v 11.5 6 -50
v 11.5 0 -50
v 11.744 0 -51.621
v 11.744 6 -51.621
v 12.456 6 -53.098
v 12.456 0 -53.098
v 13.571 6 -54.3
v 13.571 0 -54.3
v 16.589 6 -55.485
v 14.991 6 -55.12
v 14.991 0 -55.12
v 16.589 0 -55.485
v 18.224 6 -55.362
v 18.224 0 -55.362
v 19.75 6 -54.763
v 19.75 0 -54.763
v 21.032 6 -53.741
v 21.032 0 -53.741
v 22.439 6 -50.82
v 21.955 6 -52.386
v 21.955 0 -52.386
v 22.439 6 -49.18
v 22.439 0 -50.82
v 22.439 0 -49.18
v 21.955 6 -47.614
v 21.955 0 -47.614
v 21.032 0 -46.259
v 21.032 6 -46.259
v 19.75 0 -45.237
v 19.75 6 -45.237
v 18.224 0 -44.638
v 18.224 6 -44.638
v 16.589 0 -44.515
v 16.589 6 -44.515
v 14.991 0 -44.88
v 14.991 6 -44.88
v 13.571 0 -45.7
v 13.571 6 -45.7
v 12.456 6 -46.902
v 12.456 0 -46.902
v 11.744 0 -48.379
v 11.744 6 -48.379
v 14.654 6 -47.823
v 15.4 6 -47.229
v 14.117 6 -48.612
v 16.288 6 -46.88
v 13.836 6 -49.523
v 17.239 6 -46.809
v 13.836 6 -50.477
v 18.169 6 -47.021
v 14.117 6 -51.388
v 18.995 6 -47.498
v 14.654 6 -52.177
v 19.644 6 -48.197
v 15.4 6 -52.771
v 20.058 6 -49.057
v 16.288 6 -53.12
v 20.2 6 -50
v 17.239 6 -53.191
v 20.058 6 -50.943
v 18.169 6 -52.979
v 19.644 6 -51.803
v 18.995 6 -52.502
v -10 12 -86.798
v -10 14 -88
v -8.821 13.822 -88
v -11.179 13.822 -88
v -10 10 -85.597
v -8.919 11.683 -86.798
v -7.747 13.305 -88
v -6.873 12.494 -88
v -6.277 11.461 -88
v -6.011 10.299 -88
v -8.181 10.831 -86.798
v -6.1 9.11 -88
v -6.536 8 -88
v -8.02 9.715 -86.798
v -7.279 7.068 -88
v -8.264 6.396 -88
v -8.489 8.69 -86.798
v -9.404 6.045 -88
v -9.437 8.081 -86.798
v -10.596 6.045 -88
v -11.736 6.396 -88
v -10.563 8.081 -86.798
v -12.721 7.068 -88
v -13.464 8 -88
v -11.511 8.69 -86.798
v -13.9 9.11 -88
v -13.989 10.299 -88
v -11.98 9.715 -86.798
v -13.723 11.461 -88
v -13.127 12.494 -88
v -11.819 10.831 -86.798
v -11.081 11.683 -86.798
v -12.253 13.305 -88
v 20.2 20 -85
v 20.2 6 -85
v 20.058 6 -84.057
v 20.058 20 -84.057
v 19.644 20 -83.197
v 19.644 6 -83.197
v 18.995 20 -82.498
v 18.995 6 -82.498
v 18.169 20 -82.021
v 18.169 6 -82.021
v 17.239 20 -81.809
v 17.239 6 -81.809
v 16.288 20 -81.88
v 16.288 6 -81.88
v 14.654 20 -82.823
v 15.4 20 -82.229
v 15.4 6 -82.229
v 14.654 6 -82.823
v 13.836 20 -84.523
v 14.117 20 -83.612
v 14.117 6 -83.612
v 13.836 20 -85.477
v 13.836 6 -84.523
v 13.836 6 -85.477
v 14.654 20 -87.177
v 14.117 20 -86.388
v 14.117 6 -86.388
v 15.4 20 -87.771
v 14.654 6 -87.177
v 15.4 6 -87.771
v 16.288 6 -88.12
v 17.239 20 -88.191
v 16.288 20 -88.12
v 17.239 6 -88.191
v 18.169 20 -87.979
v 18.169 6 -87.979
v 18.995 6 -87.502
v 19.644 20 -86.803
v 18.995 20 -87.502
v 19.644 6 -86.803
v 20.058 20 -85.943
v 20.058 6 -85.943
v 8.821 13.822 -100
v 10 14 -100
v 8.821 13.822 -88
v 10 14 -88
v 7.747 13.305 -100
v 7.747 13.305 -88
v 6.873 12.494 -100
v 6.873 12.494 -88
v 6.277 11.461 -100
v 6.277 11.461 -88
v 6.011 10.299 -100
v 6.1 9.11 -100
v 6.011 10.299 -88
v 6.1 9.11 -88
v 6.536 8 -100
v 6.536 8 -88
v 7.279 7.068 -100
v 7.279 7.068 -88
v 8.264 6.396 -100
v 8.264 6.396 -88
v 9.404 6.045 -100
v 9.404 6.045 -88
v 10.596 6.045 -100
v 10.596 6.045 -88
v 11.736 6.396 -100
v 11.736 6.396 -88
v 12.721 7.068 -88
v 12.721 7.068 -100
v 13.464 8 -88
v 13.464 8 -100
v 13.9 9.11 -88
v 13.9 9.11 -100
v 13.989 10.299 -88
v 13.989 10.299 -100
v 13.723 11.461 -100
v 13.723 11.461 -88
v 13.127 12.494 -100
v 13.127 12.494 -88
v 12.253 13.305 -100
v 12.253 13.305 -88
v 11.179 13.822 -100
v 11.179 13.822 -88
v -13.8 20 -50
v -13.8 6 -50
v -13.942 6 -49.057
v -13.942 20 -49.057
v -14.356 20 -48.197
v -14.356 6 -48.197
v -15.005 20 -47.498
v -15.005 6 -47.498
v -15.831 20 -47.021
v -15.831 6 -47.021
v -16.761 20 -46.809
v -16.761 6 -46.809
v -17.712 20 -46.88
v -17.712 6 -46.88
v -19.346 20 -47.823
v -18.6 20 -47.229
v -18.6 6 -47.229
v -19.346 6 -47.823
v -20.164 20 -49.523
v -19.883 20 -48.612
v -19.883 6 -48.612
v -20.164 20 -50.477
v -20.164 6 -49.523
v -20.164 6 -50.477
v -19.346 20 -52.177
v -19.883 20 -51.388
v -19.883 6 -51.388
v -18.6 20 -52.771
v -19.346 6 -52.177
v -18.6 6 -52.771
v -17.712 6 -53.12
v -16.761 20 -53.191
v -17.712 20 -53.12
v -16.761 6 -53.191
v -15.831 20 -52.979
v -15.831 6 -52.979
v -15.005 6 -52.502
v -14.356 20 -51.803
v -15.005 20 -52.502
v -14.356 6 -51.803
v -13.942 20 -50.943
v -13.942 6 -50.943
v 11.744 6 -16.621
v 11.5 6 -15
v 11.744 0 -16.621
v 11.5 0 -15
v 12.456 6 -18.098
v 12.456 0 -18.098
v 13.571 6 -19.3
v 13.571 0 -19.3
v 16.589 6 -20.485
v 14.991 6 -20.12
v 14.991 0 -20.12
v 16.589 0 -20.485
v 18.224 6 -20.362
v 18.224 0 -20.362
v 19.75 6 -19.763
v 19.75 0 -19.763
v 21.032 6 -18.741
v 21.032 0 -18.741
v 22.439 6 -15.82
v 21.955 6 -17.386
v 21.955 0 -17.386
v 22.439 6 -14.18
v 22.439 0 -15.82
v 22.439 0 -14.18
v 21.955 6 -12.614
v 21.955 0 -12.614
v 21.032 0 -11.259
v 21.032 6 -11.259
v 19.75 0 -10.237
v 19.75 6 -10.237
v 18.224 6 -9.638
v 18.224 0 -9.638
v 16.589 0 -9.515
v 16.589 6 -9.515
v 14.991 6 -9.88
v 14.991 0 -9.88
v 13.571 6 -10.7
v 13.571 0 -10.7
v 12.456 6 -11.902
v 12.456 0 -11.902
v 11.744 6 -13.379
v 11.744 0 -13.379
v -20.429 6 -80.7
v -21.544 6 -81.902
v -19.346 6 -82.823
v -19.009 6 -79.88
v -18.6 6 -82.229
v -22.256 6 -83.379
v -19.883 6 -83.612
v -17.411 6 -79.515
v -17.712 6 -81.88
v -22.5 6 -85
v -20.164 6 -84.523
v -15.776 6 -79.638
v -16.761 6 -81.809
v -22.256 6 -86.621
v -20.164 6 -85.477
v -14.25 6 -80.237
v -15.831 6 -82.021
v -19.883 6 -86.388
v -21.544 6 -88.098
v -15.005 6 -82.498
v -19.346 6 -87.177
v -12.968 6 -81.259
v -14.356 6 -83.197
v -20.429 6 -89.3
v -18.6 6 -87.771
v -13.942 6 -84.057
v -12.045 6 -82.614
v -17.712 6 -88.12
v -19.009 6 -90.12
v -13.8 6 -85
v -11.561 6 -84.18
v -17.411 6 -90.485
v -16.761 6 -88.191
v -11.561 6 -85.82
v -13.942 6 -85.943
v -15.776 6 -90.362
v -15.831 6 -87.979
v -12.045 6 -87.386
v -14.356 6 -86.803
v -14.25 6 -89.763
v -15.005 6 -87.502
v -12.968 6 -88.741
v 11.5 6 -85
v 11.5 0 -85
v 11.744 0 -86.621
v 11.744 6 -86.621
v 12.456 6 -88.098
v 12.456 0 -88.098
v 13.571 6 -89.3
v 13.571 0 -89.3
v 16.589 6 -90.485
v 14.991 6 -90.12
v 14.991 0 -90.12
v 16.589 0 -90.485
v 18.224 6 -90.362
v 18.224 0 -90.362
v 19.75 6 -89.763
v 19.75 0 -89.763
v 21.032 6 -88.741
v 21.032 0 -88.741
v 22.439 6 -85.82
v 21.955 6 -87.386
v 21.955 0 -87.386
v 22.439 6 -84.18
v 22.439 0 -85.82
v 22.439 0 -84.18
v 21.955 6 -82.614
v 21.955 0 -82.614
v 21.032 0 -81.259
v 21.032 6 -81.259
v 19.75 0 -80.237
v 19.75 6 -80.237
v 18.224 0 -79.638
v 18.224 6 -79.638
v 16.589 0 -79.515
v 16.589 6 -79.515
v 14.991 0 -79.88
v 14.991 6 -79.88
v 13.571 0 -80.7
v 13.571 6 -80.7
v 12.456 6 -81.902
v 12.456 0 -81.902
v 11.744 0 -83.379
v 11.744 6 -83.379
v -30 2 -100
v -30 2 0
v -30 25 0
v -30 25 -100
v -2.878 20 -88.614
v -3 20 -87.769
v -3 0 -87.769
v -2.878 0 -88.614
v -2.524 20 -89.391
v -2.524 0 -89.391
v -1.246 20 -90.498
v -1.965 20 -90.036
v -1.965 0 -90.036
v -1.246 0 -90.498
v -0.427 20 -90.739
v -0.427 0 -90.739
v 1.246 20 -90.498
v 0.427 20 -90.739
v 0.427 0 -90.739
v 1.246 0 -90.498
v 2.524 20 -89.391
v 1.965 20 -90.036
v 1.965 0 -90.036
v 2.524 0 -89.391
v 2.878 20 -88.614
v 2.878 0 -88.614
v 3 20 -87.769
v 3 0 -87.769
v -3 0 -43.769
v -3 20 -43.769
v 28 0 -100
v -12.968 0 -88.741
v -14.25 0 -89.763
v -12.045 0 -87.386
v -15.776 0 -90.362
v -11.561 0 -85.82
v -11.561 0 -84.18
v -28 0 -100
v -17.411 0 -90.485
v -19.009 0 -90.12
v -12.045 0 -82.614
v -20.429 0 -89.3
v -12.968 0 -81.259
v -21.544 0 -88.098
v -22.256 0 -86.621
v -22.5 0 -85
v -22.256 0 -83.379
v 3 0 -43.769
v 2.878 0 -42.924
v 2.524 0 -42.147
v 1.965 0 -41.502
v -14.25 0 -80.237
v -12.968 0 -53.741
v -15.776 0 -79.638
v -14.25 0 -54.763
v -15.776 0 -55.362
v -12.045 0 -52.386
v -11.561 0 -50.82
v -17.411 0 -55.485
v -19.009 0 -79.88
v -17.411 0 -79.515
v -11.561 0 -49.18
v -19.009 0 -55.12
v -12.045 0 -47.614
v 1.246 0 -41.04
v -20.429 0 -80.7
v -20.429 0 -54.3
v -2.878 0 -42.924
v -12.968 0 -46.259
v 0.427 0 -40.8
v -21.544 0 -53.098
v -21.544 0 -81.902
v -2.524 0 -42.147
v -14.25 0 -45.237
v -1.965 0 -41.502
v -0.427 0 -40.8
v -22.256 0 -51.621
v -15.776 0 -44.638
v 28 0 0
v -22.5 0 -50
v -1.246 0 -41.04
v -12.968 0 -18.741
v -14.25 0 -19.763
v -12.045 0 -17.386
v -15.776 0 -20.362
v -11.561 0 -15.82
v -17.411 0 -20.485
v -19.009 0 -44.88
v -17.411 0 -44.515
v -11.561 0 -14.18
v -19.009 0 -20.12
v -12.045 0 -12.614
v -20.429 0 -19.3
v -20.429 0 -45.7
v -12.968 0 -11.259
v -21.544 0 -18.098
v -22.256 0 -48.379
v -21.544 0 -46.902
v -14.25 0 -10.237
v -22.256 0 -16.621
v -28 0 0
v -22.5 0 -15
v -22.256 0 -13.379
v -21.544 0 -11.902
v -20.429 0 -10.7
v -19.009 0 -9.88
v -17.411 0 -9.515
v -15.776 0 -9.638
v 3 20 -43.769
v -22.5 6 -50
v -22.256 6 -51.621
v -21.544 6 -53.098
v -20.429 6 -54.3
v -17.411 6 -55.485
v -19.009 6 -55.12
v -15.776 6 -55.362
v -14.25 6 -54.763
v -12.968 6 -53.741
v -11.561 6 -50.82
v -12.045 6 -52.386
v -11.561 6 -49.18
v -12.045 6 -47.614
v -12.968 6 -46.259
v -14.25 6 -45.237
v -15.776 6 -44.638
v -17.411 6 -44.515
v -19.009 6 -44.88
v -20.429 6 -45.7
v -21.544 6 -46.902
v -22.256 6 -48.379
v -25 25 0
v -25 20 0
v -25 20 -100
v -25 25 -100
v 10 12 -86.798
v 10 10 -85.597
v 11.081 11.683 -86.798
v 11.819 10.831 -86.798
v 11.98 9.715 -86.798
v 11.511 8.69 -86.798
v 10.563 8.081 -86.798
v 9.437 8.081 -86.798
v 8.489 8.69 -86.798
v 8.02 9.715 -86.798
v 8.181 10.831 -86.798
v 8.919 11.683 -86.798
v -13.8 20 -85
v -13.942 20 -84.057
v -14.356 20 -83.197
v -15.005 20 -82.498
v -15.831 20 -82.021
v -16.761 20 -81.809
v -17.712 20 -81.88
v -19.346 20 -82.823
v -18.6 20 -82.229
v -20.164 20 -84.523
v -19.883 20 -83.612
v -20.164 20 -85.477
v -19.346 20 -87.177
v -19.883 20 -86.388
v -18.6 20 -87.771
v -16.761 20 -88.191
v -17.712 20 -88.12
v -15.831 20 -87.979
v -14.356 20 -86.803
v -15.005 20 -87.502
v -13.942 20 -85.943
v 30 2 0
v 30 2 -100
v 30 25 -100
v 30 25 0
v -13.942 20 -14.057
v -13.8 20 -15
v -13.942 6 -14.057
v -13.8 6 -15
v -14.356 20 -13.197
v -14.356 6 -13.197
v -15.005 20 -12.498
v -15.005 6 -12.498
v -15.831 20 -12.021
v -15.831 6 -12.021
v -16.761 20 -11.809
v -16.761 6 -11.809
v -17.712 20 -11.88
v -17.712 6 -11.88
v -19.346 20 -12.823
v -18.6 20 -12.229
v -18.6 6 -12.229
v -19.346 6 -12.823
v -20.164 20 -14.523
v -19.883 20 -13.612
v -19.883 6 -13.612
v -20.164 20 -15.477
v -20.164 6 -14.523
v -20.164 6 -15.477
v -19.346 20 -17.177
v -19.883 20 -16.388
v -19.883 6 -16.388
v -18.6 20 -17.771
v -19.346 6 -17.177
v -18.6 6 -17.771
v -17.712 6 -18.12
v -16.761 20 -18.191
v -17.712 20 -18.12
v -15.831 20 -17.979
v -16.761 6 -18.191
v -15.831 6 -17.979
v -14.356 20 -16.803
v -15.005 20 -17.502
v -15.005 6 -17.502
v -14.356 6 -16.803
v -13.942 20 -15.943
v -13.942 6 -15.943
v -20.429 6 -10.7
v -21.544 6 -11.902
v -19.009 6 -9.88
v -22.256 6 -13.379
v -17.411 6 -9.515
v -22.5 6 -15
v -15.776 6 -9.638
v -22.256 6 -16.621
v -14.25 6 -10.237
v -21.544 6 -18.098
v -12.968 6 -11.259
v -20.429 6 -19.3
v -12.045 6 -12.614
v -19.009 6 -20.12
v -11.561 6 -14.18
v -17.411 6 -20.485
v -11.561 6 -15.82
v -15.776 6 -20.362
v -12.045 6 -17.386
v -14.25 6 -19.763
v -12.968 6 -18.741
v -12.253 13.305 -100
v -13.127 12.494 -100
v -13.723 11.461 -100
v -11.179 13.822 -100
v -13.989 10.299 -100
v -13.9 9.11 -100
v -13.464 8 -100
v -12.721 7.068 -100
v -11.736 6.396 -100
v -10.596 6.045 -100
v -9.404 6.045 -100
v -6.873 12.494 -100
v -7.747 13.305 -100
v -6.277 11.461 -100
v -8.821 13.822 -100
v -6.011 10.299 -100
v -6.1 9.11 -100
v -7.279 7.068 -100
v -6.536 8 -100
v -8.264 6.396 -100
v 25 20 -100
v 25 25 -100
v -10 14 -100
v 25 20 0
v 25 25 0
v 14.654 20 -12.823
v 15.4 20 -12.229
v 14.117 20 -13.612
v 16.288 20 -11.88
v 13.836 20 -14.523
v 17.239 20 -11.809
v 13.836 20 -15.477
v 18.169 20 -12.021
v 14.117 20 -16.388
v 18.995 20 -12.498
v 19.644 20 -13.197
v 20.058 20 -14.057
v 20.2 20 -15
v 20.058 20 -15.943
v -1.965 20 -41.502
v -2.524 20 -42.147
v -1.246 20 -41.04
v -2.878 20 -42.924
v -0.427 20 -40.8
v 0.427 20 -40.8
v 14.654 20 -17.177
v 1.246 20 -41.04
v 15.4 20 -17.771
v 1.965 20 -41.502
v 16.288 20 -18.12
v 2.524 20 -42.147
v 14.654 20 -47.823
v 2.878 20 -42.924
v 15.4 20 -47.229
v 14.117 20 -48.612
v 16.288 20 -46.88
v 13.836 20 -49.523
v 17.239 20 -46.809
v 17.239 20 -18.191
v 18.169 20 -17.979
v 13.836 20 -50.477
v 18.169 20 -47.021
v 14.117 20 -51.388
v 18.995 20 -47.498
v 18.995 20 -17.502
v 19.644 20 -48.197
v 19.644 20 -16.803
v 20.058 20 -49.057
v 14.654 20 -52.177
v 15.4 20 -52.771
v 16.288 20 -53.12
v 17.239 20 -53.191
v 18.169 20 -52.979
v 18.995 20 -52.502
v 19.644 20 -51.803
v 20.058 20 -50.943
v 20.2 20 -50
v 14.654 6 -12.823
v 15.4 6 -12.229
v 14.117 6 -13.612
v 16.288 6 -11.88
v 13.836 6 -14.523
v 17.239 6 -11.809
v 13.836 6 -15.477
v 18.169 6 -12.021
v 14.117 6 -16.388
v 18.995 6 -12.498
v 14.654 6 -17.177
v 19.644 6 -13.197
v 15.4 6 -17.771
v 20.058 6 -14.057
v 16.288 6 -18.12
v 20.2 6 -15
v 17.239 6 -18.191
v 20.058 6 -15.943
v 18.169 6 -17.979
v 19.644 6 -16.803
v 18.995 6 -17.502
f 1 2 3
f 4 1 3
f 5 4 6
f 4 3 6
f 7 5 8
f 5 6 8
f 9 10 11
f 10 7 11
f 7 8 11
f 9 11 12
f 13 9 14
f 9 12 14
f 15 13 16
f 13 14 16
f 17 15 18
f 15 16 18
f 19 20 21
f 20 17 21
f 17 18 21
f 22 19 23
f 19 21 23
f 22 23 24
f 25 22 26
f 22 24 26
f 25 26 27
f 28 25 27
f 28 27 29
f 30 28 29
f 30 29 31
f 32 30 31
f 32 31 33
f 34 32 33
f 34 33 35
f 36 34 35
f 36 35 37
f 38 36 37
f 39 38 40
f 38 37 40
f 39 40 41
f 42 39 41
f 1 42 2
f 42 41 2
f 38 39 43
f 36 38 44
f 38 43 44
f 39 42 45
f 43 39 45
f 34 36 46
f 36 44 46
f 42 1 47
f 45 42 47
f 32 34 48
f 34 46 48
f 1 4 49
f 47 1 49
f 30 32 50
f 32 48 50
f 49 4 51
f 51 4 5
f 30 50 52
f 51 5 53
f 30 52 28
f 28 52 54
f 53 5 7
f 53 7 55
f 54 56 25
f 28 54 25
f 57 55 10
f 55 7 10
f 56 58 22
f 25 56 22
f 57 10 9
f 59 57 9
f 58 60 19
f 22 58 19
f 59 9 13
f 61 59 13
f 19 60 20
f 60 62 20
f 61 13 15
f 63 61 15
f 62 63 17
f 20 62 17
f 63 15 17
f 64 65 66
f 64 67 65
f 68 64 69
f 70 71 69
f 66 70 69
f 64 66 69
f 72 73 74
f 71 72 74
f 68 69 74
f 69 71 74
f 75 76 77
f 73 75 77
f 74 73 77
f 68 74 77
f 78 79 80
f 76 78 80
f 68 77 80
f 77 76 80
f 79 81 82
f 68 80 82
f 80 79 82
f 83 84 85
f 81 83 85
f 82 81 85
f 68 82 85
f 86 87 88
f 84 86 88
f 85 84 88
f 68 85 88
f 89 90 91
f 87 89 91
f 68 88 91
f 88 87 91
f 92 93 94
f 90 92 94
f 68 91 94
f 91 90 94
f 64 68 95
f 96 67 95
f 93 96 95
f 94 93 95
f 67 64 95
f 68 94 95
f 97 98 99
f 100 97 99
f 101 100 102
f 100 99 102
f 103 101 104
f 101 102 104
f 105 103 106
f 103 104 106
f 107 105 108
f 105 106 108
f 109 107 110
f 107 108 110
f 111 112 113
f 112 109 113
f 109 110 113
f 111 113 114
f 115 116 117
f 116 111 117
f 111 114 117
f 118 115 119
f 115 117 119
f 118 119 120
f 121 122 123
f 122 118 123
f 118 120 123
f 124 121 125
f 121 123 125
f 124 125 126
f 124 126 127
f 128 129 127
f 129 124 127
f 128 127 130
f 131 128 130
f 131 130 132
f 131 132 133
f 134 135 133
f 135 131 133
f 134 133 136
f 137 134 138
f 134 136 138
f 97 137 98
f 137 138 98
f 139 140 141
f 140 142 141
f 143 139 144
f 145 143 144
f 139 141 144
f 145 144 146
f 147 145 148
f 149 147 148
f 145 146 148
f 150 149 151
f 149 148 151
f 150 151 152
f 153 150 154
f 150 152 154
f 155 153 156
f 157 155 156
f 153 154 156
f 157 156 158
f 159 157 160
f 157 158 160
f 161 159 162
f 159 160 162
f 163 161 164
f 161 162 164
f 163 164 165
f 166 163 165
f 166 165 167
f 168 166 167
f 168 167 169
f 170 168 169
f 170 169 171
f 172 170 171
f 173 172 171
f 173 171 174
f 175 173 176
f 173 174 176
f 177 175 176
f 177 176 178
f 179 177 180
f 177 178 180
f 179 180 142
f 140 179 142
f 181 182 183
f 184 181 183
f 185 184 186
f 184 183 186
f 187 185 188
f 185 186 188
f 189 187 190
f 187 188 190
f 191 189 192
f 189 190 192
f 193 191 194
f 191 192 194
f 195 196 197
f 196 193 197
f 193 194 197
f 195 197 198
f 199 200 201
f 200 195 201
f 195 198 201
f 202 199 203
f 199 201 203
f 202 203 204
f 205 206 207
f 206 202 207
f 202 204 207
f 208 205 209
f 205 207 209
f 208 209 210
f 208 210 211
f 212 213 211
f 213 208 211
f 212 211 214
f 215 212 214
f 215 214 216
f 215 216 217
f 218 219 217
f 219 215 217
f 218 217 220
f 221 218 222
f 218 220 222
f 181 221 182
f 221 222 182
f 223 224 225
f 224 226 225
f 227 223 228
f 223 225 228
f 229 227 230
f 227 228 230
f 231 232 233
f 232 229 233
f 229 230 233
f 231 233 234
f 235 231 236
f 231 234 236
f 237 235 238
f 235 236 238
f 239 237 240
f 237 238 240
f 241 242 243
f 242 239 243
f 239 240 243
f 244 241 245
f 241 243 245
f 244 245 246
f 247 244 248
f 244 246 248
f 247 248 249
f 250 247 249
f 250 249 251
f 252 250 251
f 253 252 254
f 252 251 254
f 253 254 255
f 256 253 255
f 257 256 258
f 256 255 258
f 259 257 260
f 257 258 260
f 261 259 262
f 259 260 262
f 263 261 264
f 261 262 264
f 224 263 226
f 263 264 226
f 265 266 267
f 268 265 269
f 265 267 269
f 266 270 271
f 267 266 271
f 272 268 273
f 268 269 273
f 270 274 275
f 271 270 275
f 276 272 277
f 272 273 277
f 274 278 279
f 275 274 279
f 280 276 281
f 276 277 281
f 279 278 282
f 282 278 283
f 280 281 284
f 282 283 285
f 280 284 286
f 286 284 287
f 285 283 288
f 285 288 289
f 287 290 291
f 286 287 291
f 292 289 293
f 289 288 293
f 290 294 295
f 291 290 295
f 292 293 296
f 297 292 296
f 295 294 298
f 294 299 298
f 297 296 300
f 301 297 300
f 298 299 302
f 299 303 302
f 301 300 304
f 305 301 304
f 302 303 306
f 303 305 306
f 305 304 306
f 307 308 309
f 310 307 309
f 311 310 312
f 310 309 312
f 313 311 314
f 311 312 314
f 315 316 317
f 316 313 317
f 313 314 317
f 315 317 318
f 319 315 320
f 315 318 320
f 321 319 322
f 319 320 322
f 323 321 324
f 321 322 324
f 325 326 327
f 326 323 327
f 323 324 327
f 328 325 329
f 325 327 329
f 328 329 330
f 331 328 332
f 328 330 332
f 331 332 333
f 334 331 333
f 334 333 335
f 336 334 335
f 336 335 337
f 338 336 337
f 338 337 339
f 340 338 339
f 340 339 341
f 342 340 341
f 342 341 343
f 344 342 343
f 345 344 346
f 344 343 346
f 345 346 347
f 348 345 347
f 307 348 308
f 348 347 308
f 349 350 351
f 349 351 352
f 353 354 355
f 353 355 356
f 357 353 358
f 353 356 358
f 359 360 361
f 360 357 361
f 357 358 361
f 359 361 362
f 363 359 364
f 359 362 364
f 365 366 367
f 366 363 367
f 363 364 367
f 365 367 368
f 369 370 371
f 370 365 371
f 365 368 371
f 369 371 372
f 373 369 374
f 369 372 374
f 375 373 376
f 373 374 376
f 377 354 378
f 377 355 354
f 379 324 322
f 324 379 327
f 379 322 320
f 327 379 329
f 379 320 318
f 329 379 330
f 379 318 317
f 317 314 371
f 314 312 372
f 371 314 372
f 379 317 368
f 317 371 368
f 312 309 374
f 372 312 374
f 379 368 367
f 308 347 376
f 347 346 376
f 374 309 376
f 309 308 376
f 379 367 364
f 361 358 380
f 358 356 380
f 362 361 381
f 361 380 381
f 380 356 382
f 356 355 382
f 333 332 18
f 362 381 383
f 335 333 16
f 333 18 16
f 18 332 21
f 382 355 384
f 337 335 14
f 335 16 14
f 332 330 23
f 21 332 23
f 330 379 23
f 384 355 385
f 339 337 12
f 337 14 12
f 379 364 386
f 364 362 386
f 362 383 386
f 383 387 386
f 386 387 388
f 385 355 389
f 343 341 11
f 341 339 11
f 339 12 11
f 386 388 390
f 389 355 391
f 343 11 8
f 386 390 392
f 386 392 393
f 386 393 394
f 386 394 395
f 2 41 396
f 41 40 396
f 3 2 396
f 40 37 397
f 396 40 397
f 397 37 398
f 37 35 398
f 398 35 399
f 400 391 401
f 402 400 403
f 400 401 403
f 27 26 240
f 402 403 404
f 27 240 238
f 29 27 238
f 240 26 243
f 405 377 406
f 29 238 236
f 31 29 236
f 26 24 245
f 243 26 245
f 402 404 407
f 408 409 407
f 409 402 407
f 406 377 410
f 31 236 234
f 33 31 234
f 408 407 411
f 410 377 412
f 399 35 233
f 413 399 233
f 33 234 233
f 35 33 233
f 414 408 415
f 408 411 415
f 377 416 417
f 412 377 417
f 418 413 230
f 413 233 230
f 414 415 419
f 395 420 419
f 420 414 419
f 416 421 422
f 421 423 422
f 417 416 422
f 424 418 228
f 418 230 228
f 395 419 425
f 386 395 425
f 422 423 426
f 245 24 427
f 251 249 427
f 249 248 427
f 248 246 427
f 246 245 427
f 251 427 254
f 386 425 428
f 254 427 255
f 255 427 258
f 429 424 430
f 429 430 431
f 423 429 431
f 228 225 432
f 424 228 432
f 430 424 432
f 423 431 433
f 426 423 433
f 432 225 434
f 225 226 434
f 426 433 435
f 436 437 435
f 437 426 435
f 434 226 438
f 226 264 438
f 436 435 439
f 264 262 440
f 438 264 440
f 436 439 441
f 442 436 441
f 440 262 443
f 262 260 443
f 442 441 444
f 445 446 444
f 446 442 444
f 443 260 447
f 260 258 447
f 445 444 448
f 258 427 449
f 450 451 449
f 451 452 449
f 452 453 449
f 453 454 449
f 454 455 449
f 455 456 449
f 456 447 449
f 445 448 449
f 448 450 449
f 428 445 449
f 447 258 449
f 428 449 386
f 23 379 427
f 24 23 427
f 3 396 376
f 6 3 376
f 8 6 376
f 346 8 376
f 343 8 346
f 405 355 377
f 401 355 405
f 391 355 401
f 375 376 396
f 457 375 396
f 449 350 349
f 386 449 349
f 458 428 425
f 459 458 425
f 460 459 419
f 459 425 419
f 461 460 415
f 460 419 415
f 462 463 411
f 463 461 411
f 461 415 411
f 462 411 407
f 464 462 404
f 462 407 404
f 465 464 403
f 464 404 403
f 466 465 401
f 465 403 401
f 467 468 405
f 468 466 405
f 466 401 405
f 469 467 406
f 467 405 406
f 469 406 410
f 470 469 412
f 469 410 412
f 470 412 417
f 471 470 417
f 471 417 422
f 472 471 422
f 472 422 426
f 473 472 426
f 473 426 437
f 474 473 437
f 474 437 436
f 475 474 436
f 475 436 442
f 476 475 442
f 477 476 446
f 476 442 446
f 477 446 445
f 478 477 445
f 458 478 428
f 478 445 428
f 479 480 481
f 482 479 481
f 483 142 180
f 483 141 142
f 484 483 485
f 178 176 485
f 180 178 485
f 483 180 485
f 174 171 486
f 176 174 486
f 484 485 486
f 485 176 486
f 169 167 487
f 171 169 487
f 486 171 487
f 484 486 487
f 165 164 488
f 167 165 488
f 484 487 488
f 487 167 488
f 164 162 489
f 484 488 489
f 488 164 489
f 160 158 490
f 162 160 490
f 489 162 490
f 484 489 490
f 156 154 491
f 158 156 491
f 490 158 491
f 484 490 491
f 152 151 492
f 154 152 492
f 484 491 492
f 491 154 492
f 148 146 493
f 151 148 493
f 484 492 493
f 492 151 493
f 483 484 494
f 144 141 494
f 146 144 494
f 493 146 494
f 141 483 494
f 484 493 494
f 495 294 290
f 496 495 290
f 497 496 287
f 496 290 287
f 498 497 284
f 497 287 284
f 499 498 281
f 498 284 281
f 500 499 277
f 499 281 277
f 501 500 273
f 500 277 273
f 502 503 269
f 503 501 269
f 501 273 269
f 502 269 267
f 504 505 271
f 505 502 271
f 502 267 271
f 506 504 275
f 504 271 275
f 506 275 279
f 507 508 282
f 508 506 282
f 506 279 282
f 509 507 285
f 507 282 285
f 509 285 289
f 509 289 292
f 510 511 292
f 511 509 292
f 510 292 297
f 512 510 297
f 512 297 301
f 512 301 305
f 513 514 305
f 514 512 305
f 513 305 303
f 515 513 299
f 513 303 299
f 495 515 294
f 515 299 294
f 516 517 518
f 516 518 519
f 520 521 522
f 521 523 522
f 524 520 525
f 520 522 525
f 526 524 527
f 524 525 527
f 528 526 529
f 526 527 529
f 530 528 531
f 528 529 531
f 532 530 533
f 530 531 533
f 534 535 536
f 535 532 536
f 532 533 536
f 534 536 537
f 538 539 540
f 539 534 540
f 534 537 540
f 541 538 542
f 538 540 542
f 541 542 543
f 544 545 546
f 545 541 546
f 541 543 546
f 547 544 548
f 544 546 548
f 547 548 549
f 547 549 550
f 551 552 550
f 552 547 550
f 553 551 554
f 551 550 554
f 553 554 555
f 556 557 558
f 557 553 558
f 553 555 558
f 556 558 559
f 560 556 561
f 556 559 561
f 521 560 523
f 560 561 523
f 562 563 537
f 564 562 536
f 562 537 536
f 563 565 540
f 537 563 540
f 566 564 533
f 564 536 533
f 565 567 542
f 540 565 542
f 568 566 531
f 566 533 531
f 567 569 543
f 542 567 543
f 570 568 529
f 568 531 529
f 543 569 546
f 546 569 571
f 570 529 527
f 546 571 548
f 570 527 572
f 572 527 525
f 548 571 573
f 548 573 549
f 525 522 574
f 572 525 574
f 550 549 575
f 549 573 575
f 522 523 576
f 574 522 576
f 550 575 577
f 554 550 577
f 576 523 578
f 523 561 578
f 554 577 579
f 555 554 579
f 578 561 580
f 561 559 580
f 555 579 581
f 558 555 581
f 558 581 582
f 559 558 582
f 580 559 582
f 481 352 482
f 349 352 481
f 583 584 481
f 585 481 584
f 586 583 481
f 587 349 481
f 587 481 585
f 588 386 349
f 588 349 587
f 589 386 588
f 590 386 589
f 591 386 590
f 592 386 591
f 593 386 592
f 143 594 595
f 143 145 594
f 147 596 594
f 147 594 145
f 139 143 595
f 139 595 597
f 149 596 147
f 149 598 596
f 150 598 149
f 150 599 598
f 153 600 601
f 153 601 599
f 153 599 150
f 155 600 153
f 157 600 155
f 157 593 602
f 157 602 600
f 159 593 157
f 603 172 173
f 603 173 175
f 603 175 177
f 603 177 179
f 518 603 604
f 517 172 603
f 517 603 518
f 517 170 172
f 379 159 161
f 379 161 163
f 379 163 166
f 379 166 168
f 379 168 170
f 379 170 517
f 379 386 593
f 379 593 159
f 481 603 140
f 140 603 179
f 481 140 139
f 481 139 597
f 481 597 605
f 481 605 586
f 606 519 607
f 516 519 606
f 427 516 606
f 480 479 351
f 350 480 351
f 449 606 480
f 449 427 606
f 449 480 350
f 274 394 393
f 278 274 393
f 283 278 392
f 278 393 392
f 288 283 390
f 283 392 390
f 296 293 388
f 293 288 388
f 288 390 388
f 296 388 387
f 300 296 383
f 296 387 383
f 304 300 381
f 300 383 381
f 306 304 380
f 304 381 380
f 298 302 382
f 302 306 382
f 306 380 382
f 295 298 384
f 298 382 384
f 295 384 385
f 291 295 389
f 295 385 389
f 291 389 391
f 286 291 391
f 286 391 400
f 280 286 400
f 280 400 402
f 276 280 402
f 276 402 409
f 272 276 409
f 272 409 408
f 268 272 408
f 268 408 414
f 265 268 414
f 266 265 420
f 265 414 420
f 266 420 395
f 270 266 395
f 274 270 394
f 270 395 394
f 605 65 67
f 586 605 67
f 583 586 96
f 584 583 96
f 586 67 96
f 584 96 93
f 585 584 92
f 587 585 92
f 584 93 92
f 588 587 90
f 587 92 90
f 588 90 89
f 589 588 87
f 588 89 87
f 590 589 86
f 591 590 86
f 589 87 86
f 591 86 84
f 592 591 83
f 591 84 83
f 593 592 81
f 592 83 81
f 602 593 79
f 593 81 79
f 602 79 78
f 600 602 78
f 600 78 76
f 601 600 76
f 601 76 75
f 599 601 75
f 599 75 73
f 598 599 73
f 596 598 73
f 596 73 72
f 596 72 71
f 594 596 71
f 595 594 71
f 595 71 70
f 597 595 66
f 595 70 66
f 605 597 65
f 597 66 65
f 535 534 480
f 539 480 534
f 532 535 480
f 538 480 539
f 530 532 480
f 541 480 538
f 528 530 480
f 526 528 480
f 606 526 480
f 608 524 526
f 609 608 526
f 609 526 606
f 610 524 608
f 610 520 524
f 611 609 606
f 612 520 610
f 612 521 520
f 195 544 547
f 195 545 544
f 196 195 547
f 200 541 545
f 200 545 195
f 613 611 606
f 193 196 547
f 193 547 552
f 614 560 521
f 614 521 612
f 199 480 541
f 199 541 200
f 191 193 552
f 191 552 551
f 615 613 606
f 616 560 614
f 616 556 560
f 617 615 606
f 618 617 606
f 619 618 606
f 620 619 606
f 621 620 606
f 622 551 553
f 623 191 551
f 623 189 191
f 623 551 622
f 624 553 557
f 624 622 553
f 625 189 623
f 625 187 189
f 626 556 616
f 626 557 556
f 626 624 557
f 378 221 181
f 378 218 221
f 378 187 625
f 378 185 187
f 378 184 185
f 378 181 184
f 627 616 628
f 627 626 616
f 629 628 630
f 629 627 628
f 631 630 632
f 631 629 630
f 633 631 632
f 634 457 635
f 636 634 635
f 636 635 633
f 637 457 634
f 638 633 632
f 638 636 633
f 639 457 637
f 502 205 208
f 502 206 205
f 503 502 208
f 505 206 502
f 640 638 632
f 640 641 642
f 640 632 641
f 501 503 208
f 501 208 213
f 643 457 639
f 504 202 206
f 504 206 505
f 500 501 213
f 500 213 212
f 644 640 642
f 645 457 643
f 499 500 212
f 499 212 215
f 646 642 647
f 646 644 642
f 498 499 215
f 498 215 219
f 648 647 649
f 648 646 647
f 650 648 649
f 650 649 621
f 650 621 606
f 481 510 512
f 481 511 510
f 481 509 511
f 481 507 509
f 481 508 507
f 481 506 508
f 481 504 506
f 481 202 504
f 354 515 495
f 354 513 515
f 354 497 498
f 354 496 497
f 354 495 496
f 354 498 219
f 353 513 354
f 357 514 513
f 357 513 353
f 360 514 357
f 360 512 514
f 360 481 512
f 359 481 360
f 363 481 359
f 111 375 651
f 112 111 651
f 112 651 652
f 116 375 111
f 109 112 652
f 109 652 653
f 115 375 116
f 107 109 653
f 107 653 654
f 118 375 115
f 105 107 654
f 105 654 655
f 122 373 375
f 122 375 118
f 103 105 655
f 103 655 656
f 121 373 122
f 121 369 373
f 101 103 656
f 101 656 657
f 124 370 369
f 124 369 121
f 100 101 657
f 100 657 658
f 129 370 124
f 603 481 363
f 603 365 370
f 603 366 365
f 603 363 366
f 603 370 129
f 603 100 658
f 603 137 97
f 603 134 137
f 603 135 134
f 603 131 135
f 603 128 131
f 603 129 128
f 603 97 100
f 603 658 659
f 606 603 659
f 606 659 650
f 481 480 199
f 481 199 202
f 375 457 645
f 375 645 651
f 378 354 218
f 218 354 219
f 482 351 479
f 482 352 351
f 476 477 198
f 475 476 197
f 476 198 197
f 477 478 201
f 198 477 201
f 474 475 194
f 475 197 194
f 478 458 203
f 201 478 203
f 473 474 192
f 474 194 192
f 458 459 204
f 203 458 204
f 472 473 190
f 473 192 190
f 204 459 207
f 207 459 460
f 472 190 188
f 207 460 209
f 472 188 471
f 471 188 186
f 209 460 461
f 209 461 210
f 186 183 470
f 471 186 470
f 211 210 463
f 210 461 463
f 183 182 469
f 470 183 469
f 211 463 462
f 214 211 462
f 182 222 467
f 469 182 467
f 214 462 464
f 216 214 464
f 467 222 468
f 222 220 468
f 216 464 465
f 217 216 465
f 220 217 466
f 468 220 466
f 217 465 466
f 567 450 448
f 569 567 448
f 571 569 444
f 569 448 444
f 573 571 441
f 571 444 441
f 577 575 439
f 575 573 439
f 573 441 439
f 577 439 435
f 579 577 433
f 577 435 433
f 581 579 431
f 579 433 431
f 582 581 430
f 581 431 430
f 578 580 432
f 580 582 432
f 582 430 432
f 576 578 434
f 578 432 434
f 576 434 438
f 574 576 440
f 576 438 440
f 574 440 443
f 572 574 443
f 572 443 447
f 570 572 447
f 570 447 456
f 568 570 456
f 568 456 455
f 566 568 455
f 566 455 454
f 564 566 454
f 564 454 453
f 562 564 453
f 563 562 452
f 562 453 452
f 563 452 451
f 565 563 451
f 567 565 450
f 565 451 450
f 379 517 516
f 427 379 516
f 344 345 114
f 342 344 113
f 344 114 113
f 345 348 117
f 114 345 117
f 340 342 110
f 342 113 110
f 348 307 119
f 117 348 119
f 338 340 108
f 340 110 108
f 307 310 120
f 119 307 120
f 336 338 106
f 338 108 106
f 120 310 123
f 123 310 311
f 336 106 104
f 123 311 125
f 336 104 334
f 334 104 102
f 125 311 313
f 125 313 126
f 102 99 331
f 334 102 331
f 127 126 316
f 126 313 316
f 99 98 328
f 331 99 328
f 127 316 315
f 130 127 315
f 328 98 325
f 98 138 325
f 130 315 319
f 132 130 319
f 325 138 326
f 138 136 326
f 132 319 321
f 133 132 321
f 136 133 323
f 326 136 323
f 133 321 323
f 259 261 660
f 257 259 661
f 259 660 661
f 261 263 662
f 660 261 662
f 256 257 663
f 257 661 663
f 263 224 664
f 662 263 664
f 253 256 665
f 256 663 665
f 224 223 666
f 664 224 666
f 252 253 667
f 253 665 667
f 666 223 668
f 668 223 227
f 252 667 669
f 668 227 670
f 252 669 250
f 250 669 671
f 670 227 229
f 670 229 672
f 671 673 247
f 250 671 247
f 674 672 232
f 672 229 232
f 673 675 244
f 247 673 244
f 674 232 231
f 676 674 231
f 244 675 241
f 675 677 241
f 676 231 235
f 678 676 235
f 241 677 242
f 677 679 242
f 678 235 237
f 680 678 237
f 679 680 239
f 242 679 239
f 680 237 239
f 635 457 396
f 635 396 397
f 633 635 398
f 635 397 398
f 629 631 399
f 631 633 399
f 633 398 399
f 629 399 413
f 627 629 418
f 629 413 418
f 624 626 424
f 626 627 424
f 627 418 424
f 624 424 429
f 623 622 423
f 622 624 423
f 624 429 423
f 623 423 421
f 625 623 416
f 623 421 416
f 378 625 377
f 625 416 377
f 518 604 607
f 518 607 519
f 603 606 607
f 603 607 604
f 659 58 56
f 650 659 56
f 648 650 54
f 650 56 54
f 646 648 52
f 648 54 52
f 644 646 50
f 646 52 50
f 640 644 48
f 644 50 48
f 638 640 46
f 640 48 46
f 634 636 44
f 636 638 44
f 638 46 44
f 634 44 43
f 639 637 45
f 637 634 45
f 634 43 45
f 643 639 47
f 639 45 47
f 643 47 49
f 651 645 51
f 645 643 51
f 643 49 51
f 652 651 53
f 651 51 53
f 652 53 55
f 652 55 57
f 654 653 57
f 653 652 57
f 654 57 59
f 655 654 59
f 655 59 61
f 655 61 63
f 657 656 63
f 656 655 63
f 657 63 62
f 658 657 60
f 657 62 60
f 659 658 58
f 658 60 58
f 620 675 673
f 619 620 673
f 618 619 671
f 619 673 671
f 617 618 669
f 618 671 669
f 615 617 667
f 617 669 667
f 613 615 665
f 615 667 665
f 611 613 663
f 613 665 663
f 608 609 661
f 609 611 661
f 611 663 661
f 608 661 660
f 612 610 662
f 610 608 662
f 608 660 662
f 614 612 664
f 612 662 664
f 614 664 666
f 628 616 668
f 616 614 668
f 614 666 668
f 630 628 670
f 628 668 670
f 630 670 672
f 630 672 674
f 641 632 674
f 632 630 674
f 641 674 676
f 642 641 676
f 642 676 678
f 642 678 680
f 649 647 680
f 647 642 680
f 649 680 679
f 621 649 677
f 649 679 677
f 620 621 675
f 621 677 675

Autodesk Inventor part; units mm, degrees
ref_plane "YZ Plane" through (0, 0, 0) normal (1, 0, 0) x (0, 1, 0)
ref_plane "XZ Plane" through (0, 0, 0) normal (0, 1, 0) x (-1, 0, 0)
ref_plane "XY Plane" through (0, 0, 0) normal (0, 0, 1) x (1, 0, 0)
sketch "Sketch1" plane through (0, 0, 0) normal (0, 1, 0) x (-1, 0, 0)
  line L0 (0, 0) -> (-30, 0)
  line L1 (0, 0) -> (30, 0)
  line L2 (30, 0) -> (30, -100)
  line L3 (30, -100) -> (-30, -100)
  line L4 (-30, -100) -> (-30, 0)
  circle A0 centre (17, -85) radius 5.5
  circle A1 centre (17, -50) radius 5.5
  circle A2 centre (17, -15) radius 5.5
  circle A3 centre (-17, -15) radius 5.5
  circle A4 centre (-17, -50) radius 5.5
  circle A5 centre (-17, -85) radius 5.5
  arc A6 (-3, -87.7691) -> (3, -87.7691) centre (0, -87.7691) ccw
  arc A7 (3, -43.7691) -> (-3, -43.7691) centre (0, -43.7691) ccw
  line L5 (3, -87.7691) -> (3, -43.7691)
  line L6 (-3, -87.7691) -> (-3, -43.7691)
  dimension "d0" = 30
  dimension "d1" = 30
  dimension "d2" = 100
  dimension "d3" = 11
  dimension "d4" = 11
  dimension "d5" = 11
  dimension "d6" = 11
  dimension "d7" = 11
  dimension "d8" = 11
  dimension "d9" = 15
  dimension "d10" = 35
  dimension "d11" = 70
  dimension "d12" = 13
  dimension "d13" = 6
  dimension "d14" = 6
  dimension "d15" = 44
  dimension "d16" = 13
extrude "Extrusion1" add sketch "Sketch1" along normal blind 6
sketch "Sketch2" plane through (0, 6, 0) normal (0, 1, 0) x (1, 0, 0)
  line L0 (-30, 100) -> (-30, 0) projected
  line L1 (30, 0) -> (30, 100) projected
  line L2 (-30, 100) -> (30, 100)
  line L3 (30, 100) -> (30, 0)
  line L4 (-30, 0) -> (30, 0) projected
  line L5 (-30, 0) -> (-30, 100)
  circle A0 centre (-17, 85) radius 3.2
  circle A1 centre (-17, 15) radius 3.2
  circle A2 centre (17, 15) radius 3.2
  circle A3 centre (17, 50) radius 3.2
  circle A4 centre (17, 85) radius 3.2
  circle A5 centre (-17, 50) radius 3.2
  line L6 (-3, 43.7691) -> (-3, 87.7691) projected
  line L7 (-3, 87.7691) -> (-3, 43.7691)
  line L8 (3, 87.7691) -> (3, 43.7691) projected
  line L9 (3, 87.7691) -> (3, 43.7691)
  arc A6 (3, 87.7691) -> (-3, 87.7691) centre (0, 87.7691) ccw
  arc A7 (-3, 43.7691) -> (3, 43.7691) centre (0, 43.7691) ccw projected
  arc A8 (-3, 43.7691) -> (3, 43.7691) centre (0, 43.7691) ccw
  point P0 (0, 0)
  dimension "d19" = 6.4
  dimension "d21" = 6.4
  dimension "d22" = 6.4
  dimension "d23" = 6.4
  dimension "d24" = 6.4
  dimension "d25" = 15
  dimension "d26" = 35
  dimension "d27" = 70
  dimension "d28" = 13
  dimension "d29" = 13
  dimension "d30" = 6.4
  dimension "d31" = 6
extrude "Extrusion2" add sketch "Sketch2" along normal blind 14
sketch "Sketch4" plane through (30, 20, -100) normal (0, 0, -1) x (-1, 0, 0)
  circle A0 centre (20, -10) radius 4
  circle A1 centre (40, -10) radius 4
  line L0 (0, 0) -> (60, 0) projected
  line L1 (0, -20) -> (0, 0) projected
  line L2 (60, -20) -> (60, 0) projected
  point P0 (30, -20)
  point P1 (0, -25)
  point P2 (60, -25)
  dimension "d43" = 8
  dimension "d44" = 8
  dimension "d45" = 10
  dimension "d46" = 20
  dimension "d47" = 20
hole "Hole1" at (-10, 10, -100) at (10, 10, -100) direction (0, 0, 1) diameter 8 depth 12 tip angle 118
sketch "Sketch5" plane through (0, 20, 0) normal (0, 1, 0) x (1, 0, 0)
  line L0 (30, 100) -> (-30, 100) projected
  line L1 (30, 0) -> (30, 100) projected
  line L2 (30, 100) -> (30, 0)
  line L3 (30, 0) -> (25, 0)
  line L4 (-30, 0) -> (30, 0) projected
  line L5 (25, 0) -> (25, 100)
  line L6 (25, 100) -> (30, 100)
  line L7 (-30, 100) -> (-30, 0) projected
  line L8 (-30, 100) -> (-30, 0)
  line L9 (-30, 0) -> (-25, 0)
  line L10 (-25, 0) -> (-25, 100)
  line L11 (-30, 100) -> (-25, 100)
  point P0 (0, 0)
  dimension "d55" = 100
  dimension "d56" = 5
  dimension "d57" = 100
  dimension "d58" = 5
extrude "Extrusion4" add sketch "Sketch5" along normal blind 5 contours L1 L3 L5 L0 | L10 L4 L7 L0
chamfer "Chamfer1" distance 2 angle 45 1 edges at (-30, 0, -50) measured on face at (27.5, 0, -50)
chamfer "Chamfer2" distance 2 angle 45 1 edges at (30, 0, -50) measured on face at (27.5, 0, -50)
properties part number "Schneidführungs"
